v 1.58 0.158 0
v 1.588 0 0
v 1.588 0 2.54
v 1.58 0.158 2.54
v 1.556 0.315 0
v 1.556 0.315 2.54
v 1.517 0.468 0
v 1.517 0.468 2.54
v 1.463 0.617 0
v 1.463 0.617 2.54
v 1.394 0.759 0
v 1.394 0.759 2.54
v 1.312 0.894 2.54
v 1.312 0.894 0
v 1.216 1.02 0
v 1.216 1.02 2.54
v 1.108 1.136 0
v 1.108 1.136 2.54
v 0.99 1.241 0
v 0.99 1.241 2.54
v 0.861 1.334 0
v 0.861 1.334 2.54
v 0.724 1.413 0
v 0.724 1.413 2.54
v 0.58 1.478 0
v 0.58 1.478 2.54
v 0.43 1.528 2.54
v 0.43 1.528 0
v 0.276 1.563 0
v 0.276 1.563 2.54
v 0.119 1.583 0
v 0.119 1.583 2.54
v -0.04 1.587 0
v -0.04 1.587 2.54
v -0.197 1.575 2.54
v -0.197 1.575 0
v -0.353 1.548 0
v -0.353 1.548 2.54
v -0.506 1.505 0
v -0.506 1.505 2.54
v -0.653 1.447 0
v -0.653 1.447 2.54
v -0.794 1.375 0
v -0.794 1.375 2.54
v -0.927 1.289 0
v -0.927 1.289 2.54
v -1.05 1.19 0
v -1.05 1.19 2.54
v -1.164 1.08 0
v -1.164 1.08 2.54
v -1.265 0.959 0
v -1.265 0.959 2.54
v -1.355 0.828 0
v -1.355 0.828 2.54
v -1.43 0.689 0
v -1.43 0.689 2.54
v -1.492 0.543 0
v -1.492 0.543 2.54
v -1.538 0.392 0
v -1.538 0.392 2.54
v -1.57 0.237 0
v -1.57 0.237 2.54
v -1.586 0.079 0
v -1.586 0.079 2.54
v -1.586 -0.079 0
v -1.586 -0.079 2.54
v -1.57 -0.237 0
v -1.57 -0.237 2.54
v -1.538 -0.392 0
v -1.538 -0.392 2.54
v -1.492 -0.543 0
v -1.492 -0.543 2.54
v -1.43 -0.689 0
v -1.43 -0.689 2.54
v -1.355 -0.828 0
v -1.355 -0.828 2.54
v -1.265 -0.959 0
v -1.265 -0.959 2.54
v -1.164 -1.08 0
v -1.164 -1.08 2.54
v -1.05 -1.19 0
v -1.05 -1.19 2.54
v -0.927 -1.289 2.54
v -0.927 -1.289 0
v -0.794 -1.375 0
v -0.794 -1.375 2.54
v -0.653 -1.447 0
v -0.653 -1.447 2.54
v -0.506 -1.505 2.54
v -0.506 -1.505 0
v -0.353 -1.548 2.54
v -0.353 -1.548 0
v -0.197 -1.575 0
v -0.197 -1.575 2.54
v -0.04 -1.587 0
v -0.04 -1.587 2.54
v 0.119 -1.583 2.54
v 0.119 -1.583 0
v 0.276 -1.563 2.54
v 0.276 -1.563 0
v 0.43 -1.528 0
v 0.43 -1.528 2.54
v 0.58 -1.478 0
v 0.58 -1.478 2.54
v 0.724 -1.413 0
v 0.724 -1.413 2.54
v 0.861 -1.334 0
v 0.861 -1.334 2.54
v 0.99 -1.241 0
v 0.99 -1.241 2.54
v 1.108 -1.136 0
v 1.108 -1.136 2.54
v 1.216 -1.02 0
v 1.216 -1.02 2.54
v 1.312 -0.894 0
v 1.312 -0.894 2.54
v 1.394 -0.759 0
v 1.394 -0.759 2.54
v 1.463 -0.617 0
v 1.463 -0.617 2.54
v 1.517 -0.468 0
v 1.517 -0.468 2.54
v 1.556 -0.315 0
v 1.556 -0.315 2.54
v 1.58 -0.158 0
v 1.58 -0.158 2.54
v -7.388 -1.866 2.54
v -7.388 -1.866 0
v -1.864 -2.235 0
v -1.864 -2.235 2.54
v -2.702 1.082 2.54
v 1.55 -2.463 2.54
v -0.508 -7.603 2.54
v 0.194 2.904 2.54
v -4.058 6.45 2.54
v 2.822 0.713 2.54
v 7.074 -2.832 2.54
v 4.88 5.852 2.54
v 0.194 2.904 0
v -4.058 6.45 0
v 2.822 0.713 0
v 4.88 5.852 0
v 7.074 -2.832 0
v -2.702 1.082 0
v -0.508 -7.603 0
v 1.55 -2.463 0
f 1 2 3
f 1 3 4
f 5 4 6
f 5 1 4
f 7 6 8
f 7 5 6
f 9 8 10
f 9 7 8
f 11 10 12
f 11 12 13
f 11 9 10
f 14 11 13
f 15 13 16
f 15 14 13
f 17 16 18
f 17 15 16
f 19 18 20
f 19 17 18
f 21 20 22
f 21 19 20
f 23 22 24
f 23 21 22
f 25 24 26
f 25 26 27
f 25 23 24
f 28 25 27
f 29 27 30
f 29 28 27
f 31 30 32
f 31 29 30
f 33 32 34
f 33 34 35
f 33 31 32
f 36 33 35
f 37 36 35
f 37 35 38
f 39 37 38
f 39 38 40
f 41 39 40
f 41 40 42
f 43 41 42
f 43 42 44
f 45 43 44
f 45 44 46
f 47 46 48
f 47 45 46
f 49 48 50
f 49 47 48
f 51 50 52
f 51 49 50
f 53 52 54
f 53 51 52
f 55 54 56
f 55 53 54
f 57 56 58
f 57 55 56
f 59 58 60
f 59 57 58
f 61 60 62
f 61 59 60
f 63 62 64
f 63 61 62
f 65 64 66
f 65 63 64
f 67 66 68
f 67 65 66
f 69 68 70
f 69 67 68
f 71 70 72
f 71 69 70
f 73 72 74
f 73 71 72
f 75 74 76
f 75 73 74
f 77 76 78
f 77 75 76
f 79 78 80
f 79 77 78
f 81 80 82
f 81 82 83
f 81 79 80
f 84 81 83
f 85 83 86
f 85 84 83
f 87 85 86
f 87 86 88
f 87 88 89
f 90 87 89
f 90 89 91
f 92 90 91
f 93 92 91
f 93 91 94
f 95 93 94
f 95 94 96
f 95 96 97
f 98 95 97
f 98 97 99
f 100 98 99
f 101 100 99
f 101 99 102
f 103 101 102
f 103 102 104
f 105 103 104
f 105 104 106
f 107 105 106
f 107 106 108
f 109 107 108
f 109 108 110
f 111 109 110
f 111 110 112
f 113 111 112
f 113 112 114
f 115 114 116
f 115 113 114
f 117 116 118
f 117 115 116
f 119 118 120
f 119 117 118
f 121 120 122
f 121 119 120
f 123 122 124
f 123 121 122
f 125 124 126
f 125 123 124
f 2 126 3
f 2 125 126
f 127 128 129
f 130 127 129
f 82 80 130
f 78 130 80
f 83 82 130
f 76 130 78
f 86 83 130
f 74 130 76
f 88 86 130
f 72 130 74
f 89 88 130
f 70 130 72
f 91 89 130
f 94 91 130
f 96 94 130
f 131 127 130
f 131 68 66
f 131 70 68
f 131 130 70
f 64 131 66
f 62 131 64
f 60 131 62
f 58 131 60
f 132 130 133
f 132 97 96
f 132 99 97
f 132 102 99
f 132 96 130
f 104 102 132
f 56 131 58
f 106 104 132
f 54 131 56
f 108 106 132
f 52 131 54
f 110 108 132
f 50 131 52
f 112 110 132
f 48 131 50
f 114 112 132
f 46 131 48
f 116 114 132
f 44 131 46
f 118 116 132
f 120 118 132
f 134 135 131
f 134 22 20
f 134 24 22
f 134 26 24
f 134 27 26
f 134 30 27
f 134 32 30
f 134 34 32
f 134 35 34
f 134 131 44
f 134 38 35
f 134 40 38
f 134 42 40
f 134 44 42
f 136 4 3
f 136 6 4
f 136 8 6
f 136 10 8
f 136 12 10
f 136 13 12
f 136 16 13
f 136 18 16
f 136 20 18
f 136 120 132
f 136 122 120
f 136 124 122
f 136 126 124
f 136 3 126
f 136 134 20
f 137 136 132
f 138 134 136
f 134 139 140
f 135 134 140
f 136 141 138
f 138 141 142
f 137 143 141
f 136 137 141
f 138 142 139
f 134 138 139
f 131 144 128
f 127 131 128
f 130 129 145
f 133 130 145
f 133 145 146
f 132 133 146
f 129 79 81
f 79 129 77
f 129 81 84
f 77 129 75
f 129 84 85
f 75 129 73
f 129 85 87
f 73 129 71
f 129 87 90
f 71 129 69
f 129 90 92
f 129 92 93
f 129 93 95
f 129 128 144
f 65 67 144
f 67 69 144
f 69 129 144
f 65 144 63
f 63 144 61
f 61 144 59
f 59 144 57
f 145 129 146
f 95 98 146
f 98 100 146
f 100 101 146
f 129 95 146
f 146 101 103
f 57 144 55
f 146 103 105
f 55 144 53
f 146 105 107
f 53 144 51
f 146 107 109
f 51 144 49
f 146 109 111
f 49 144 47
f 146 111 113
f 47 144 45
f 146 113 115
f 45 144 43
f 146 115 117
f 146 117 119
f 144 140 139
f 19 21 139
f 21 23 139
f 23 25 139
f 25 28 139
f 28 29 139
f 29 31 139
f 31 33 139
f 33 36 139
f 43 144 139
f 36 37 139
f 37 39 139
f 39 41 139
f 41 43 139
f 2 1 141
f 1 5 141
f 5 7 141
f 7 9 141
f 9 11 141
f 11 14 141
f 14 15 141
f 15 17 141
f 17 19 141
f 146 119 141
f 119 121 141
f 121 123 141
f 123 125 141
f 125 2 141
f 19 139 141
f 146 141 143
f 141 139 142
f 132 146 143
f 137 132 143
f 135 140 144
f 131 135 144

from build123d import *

# Parameters (mm, degrees)
F0_R     = 1.5875
F1_DEPTH = 2.54


with BuildPart() as f1:
    # F0 (on Top) → F1 (new body)
    with BuildSketch(Plane.XY):
        Polygon((0.193984, 2.904109), (-4.0581, 6.449514), (-2.702028, 1.081909), (-7.387874, -1.866473), (-1.863929, -2.235453), (-0.507857, -7.603057), (1.550056, -2.463495), (7.074001, -2.832475), (2.821917, 0.712929), (4.87983, 5.852492), align=None)
        Circle(F0_R, mode=Mode.SUBTRACT)
    extrude(amount=F1_DEPTH)


solid = f1.part
